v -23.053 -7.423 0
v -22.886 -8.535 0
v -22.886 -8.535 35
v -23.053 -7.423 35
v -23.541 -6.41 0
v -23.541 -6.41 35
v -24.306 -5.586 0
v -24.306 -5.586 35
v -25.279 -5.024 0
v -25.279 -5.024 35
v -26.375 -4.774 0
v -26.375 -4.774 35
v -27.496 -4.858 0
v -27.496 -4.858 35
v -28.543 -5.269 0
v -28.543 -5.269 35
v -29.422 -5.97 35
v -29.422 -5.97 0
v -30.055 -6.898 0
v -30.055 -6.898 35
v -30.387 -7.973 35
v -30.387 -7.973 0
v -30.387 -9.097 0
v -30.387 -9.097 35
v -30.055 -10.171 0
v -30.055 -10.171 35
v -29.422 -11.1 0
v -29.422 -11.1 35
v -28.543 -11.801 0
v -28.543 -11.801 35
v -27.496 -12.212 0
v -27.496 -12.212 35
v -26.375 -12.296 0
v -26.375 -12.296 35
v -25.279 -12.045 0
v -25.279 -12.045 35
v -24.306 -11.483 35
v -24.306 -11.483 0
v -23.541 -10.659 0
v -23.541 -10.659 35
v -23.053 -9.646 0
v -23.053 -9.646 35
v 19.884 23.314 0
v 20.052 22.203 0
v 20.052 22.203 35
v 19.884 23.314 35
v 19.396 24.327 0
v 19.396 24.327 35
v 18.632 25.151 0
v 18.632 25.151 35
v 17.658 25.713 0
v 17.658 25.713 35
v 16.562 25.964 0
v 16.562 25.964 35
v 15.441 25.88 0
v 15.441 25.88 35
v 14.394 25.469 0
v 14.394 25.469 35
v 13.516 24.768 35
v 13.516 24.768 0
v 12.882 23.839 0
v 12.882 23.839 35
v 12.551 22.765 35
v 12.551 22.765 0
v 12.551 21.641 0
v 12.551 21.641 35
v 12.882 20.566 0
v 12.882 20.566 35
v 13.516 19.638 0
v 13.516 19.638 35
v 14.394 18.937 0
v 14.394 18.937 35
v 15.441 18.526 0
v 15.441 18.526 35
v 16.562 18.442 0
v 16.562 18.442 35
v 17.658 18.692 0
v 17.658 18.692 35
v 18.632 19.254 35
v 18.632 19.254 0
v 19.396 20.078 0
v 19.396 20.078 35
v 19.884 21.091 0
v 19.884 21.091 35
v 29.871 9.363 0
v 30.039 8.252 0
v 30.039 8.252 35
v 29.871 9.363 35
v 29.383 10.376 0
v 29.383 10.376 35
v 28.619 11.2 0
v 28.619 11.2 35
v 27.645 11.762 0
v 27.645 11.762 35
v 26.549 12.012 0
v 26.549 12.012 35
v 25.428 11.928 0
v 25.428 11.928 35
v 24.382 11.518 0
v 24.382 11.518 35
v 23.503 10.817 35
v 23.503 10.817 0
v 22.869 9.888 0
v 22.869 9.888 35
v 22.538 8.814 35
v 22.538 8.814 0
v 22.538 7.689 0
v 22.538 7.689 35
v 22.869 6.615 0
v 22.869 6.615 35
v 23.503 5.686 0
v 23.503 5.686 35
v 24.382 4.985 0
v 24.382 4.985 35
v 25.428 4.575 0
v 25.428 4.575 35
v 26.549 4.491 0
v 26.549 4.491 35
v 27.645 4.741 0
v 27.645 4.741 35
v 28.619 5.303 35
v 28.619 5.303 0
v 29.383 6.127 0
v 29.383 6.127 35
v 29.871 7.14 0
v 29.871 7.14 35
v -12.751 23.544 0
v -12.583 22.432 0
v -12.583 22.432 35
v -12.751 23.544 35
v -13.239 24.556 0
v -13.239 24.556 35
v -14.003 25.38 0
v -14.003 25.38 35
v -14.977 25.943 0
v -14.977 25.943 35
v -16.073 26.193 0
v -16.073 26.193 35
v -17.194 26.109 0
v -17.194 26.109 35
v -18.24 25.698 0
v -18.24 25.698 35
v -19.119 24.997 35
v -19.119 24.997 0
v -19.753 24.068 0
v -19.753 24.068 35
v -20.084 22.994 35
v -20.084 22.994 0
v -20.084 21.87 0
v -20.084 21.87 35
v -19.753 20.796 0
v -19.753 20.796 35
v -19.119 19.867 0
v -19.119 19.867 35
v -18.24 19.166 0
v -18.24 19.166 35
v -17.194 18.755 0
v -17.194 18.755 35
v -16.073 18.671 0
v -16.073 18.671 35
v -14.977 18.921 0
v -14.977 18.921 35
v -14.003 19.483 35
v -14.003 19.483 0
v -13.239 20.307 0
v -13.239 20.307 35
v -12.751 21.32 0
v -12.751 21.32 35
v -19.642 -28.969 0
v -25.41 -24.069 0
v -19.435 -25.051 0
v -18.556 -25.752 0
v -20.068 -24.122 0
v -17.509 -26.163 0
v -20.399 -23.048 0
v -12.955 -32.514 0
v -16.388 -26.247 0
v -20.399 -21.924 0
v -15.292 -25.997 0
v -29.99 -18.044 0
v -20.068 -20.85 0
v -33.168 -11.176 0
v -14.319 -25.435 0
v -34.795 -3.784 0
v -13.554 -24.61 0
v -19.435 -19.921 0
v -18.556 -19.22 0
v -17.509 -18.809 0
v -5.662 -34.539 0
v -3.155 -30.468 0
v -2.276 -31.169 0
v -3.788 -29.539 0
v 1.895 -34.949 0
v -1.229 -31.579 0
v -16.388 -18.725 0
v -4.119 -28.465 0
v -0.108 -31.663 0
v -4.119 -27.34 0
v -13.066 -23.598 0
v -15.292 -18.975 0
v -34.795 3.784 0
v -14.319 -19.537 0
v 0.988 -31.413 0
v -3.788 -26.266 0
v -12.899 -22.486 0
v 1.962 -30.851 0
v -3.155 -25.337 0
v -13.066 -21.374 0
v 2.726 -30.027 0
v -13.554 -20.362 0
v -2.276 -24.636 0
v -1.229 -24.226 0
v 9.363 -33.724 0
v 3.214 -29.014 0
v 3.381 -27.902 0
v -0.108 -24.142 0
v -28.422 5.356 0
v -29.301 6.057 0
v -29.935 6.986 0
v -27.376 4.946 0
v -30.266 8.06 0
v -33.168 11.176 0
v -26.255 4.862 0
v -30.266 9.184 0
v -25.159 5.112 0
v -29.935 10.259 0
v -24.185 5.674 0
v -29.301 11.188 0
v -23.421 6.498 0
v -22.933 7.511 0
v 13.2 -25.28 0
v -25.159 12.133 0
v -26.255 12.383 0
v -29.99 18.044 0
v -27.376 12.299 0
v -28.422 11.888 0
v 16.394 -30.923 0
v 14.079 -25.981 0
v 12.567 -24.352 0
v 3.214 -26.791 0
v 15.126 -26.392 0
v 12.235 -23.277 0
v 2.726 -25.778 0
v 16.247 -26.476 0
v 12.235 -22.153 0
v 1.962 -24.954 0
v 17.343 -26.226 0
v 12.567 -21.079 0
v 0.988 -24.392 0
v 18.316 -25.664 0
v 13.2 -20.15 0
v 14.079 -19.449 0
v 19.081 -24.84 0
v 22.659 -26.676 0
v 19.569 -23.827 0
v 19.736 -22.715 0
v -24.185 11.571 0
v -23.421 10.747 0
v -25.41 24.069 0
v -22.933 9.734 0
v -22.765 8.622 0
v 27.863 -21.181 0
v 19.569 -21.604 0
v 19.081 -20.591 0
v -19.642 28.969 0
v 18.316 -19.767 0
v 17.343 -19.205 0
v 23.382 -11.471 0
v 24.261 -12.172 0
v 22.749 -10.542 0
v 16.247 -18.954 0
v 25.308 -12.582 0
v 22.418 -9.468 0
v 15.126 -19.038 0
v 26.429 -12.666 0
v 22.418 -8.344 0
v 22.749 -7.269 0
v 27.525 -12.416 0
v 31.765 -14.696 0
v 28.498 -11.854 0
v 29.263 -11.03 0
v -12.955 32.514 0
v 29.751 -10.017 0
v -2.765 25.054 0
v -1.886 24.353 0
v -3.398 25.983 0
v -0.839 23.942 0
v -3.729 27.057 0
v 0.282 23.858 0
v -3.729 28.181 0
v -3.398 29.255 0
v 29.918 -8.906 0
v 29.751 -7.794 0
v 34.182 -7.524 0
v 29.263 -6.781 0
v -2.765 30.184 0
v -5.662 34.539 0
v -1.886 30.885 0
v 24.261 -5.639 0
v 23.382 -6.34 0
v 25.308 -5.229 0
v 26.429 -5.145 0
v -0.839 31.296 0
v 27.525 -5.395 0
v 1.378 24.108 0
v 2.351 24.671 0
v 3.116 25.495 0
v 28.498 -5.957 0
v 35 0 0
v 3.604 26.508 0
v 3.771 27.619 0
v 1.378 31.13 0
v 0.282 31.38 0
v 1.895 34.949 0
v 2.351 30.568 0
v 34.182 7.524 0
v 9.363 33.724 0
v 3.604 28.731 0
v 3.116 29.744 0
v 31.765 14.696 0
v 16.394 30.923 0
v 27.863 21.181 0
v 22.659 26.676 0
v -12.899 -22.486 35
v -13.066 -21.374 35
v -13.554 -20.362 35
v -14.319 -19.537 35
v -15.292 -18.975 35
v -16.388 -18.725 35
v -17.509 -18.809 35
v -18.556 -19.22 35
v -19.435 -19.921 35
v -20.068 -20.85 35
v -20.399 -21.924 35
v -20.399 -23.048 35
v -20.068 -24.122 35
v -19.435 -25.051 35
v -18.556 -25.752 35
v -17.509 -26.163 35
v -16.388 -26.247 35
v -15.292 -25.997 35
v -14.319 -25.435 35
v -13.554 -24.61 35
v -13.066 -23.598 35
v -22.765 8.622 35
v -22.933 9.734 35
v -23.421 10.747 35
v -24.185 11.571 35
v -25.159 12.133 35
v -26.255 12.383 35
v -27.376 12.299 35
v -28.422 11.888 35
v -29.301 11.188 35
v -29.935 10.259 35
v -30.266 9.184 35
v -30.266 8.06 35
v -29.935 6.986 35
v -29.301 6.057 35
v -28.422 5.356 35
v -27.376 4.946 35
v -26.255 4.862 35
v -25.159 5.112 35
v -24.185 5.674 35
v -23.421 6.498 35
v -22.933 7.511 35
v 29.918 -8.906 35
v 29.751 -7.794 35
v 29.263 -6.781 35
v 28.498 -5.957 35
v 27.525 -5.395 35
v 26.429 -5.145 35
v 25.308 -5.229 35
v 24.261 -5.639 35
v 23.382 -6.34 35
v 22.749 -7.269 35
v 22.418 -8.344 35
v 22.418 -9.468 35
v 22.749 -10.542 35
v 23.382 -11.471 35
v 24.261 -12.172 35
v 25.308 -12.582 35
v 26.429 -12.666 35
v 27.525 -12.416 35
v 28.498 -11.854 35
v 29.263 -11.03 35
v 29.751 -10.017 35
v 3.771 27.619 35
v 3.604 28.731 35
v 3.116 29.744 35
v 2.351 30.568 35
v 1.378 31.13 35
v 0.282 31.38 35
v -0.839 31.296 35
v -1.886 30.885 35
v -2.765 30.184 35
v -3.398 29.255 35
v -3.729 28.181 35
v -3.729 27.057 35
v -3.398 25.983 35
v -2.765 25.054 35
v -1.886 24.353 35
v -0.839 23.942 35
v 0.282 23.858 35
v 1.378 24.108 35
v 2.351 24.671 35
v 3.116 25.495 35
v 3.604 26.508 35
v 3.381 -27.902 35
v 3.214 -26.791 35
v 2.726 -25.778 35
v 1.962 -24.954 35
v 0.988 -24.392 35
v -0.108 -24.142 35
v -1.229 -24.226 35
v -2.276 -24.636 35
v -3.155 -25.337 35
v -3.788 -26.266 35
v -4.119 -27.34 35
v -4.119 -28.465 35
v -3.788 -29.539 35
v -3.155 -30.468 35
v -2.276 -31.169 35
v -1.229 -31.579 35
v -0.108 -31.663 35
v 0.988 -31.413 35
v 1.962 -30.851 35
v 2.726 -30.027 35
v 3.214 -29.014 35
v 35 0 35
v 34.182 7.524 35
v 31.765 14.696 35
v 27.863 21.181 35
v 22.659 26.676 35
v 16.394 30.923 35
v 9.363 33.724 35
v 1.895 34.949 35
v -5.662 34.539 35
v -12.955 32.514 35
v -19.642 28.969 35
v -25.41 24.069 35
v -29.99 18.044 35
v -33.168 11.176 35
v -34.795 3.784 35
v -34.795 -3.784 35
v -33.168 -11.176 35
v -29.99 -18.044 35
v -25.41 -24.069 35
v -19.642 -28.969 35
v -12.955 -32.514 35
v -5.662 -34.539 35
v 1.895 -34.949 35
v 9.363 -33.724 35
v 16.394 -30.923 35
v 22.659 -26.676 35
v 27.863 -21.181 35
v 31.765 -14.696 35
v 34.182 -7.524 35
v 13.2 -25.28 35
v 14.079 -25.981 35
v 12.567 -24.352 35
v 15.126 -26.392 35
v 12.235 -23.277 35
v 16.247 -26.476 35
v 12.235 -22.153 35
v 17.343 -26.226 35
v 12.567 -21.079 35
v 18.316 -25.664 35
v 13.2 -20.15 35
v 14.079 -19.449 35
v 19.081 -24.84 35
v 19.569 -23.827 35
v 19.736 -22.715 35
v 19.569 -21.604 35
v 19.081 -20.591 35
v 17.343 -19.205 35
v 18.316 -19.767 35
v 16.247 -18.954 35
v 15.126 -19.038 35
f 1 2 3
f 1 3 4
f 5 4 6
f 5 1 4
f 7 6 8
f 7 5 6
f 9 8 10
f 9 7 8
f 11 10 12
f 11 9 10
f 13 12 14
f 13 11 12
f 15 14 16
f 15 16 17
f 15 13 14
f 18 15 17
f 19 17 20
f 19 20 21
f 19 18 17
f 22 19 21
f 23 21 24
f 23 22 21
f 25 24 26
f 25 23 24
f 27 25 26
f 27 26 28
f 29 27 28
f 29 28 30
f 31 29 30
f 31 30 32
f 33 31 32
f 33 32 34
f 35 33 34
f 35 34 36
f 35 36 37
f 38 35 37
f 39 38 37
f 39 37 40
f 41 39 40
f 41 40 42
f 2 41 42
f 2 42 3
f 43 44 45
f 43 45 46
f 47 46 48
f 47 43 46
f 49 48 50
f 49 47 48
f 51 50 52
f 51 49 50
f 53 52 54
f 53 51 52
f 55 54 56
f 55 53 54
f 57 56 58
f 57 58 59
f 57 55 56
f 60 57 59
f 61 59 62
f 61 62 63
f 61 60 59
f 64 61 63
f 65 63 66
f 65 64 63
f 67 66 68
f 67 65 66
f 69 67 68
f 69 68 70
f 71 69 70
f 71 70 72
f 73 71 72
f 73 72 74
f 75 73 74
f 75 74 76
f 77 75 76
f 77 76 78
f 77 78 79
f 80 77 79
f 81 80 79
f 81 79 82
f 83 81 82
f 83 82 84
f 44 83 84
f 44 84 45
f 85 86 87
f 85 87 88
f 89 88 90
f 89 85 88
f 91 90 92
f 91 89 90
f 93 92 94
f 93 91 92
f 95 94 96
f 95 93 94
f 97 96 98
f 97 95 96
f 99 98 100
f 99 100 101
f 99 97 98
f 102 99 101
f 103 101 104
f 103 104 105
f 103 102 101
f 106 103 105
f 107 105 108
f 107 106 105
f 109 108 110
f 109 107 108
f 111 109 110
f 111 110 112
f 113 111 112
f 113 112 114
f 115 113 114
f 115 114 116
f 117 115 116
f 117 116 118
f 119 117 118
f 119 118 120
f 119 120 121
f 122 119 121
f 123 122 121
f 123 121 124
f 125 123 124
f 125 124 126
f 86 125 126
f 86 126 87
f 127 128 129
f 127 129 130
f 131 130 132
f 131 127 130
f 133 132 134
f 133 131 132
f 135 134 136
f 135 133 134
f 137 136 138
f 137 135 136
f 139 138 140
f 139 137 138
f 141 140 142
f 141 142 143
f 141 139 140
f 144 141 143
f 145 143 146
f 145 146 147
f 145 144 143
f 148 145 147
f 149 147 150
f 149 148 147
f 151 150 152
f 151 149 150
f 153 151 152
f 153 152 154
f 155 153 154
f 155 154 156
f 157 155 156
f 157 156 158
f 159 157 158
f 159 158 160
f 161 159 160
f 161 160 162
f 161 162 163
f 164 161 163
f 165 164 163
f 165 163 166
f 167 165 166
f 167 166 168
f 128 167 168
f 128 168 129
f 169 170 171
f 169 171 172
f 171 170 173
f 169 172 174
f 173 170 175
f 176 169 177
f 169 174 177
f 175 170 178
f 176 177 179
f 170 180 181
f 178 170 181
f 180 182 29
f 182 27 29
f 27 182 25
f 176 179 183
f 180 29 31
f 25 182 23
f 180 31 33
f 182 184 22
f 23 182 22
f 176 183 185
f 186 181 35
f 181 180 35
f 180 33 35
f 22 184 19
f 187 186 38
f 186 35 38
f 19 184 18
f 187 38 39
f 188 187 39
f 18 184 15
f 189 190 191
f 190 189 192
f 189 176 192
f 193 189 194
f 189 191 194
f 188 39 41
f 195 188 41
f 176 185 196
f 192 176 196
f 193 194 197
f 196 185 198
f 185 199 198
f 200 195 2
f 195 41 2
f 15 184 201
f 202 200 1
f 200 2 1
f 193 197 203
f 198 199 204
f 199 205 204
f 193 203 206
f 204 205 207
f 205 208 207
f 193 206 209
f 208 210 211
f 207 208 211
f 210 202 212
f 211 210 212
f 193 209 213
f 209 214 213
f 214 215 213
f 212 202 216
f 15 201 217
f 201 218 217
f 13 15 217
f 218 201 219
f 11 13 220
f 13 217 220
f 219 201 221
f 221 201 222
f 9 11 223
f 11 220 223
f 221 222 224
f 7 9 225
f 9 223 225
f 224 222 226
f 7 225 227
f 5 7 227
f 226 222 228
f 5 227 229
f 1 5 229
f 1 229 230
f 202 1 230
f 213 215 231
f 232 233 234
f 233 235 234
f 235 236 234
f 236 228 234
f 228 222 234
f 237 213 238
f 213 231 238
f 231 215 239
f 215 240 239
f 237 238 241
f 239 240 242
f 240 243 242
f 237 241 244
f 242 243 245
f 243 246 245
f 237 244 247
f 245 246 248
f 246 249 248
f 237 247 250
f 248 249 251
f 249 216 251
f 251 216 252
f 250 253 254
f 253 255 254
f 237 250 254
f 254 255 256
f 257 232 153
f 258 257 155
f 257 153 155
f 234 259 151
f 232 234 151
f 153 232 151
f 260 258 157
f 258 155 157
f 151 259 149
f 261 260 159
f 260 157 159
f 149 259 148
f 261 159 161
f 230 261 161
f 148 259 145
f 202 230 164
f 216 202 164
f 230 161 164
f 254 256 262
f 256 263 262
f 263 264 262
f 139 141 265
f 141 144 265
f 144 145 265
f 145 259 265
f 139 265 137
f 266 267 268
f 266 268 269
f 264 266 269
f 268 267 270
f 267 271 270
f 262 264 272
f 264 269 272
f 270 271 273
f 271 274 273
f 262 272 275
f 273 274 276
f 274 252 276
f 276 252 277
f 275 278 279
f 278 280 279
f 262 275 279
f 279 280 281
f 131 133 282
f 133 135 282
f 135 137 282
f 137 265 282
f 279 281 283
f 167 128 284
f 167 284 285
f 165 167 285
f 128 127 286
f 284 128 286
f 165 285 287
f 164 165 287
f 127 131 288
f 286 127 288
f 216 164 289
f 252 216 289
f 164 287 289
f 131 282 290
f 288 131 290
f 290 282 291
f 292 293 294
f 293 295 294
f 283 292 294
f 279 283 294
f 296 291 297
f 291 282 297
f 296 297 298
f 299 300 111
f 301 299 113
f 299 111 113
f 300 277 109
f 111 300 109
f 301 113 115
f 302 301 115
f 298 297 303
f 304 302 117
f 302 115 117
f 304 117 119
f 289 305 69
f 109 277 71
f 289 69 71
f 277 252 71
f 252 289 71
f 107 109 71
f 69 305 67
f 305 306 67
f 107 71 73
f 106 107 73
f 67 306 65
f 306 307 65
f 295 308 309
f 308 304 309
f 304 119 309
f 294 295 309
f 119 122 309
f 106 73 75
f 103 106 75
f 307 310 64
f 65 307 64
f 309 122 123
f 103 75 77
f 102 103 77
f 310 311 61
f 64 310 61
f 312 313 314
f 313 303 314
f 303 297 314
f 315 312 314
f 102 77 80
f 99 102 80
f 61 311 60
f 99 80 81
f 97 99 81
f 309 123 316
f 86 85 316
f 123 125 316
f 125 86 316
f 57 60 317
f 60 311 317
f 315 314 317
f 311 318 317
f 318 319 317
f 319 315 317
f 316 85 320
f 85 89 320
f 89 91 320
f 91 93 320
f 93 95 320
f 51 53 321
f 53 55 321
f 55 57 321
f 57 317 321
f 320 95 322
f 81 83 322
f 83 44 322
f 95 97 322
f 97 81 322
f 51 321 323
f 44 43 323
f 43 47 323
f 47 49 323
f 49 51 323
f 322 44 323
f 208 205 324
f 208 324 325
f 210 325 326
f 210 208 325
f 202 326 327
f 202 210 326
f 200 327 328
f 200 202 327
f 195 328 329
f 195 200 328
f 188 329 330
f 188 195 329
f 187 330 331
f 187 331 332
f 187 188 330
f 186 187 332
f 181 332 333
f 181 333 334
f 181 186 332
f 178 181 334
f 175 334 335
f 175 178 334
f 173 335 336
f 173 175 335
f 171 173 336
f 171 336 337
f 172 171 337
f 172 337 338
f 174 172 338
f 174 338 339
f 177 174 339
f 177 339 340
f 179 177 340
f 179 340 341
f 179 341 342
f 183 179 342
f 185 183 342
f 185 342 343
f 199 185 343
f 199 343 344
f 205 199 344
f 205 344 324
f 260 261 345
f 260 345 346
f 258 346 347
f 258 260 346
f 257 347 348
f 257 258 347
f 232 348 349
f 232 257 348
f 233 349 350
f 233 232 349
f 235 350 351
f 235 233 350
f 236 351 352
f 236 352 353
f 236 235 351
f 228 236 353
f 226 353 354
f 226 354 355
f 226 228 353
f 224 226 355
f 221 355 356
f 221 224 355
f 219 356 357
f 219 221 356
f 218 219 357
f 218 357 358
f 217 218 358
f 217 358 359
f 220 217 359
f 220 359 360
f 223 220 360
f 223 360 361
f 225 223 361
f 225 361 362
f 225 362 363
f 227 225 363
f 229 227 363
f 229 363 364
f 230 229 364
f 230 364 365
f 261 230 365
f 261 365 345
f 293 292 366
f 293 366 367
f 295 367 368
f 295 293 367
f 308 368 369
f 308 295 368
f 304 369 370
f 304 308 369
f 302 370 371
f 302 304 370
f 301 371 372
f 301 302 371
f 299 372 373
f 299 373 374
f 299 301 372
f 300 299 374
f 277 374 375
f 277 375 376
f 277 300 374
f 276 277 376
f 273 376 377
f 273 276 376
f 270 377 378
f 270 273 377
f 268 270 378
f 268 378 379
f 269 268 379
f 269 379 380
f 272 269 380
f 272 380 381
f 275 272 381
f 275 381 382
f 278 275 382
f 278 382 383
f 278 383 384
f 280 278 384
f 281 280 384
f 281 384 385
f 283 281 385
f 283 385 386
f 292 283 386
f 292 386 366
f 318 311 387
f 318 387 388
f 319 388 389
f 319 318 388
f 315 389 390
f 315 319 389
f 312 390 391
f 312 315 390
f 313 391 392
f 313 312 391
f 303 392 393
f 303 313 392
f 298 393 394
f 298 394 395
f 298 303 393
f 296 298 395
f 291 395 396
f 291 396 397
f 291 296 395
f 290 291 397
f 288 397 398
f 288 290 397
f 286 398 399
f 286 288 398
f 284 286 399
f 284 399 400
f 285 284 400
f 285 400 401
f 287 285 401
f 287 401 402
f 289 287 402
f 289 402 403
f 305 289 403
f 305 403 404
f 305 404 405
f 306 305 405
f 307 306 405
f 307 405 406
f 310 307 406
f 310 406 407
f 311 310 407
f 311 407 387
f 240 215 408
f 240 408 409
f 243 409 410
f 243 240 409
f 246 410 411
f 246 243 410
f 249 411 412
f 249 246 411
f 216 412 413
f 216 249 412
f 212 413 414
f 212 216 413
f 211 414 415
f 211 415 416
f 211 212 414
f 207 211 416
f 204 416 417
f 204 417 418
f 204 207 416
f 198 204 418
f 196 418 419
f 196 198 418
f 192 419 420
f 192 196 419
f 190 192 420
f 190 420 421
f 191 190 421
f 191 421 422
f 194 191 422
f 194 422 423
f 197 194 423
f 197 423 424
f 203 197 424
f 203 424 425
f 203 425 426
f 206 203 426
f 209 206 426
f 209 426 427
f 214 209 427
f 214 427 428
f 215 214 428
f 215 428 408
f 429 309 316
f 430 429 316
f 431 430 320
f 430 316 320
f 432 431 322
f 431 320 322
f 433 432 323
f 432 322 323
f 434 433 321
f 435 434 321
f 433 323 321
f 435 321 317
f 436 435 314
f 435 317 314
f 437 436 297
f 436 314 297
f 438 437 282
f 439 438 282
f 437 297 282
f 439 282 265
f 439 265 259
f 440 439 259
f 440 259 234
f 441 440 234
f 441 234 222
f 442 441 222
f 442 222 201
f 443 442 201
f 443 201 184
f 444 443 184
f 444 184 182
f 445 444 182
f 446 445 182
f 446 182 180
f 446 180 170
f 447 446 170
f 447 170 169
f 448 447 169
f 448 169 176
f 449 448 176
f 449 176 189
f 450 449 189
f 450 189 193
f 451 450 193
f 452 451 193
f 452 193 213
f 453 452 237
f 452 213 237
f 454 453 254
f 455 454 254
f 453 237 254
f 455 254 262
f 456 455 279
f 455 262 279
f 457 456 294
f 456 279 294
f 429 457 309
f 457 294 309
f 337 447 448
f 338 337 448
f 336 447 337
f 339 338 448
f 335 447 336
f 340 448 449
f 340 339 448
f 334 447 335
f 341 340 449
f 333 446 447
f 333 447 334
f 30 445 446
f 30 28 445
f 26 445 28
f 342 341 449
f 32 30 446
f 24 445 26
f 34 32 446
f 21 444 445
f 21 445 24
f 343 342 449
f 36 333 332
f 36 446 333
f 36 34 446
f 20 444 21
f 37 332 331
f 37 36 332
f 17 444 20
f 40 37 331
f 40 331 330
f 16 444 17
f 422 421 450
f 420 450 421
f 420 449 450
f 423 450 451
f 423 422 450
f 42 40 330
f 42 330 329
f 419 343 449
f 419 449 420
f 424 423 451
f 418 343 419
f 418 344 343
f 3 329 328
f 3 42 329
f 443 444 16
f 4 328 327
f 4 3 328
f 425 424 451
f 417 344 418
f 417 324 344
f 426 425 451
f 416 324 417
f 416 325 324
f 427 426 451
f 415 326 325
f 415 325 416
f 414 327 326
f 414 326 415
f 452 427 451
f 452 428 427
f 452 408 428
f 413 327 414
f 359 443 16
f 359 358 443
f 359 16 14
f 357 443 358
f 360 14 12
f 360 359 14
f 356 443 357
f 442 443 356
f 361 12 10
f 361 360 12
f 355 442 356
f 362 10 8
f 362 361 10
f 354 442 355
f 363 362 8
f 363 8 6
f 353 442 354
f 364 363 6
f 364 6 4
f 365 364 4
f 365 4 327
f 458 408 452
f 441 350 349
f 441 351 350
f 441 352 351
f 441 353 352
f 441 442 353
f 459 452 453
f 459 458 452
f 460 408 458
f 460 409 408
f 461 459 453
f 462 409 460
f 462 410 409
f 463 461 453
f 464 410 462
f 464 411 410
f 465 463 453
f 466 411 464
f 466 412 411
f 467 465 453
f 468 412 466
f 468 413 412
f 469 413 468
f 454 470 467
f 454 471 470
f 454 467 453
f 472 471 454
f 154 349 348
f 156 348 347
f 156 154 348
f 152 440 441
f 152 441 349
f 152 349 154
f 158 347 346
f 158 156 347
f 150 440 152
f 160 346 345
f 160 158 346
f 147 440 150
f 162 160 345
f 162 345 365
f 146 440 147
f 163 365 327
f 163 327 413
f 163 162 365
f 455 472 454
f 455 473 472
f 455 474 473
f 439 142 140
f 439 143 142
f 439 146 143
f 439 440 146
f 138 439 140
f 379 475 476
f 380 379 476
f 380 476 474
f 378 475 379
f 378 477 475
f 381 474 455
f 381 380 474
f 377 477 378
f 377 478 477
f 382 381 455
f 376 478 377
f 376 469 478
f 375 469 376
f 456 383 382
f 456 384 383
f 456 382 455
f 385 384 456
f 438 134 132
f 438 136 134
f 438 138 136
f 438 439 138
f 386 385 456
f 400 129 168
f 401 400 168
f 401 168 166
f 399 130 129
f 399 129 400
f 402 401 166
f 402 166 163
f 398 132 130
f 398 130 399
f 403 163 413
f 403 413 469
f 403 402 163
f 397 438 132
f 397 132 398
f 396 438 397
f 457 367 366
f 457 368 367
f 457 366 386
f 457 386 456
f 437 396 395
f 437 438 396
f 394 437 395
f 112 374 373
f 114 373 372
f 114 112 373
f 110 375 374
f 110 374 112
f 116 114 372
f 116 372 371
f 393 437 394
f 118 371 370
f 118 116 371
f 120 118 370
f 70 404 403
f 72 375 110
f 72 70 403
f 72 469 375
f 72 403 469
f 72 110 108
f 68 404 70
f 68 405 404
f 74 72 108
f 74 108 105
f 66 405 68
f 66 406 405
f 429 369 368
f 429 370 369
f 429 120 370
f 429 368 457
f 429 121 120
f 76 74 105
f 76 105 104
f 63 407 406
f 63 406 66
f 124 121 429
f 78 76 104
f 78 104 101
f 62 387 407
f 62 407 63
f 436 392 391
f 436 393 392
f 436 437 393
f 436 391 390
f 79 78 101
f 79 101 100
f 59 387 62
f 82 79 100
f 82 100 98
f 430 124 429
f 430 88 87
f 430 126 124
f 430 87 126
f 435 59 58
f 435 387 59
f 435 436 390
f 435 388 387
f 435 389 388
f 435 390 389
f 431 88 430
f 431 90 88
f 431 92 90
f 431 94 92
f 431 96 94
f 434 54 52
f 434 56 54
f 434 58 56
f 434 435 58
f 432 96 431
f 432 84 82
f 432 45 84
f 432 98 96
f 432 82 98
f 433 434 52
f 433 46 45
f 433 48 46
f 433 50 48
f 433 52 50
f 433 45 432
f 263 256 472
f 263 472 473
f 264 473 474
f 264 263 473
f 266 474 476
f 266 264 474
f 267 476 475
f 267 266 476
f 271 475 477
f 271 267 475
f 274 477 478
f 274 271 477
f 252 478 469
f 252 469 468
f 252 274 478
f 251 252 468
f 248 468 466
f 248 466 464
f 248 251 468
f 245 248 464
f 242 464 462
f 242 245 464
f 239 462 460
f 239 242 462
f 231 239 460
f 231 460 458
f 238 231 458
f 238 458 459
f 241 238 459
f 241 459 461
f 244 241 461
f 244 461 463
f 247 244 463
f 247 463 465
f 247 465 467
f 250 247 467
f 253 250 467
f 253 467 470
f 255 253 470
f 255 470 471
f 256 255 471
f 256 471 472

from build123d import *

# Parameters (mm, degrees)
F0_R     = 35
F0_R_2   = 3.771368
F1_DEPTH = 35
F2_DEPTH = 25


with BuildPart() as f1:
    # F0 (on Top) → F1 (new body)
    with BuildSketch(Plane.XY):
        Circle(F0_R)
        with Locations((-0.389893, -27.902429)):
            Circle(F0_R_2, mode=Mode.SUBTRACT)
        with Locations((-16.670046, -22.486003)):
            Circle(F0_R_2, mode=Mode.SUBTRACT)
        with Locations((-26.65727, -8.534788)):
            Circle(F0_R_2, mode=Mode.SUBTRACT)
        with Locations((15.964723, -22.715176)):
            Circle(F0_R_2, mode=Mode.SUBTRACT)
        with Locations((26.146894, -8.905599)):
            Circle(F0_R_2, mode=Mode.SUBTRACT)
        with Locations((-26.536787, 8.622325)):
            Circle(F0_R_2, mode=Mode.SUBTRACT)
        with Locations((-16.354616, 22.431902)):
            Circle(F0_R_2, mode=Mode.SUBTRACT)
        with Locations((26.267377, 8.251514)):
            Circle(F0_R_2, mode=Mode.SUBTRACT)
        with Locations((16.280153, 22.202729)):
            Circle(F0_R_2, mode=Mode.SUBTRACT)
        with Locations((0, 27.619155)):
            Circle(F0_R_2, mode=Mode.SUBTRACT)
    extrude(amount=F1_DEPTH)

    # F0 (on Top) → F2 (join)
    with BuildSketch(Plane.XY):
        Circle(F0_R)
        with Locations((-0.389893, -27.902429)):
            Circle(F0_R_2, mode=Mode.SUBTRACT)
        with Locations((-16.670046, -22.486003)):
            Circle(F0_R_2, mode=Mode.SUBTRACT)
        with Locations((-26.65727, -8.534788)):
            Circle(F0_R_2, mode=Mode.SUBTRACT)
        with Locations((15.964723, -22.715176)):
            Circle(F0_R_2, mode=Mode.SUBTRACT)
        with Locations((26.146894, -8.905599)):
            Circle(F0_R_2, mode=Mode.SUBTRACT)
        with Locations((-26.536787, 8.622325)):
            Circle(F0_R_2, mode=Mode.SUBTRACT)
        with Locations((-16.354616, 22.431902)):
            Circle(F0_R_2, mode=Mode.SUBTRACT)
        with Locations((26.267377, 8.251514)):
            Circle(F0_R_2, mode=Mode.SUBTRACT)
        with Locations((16.280153, 22.202729)):
            Circle(F0_R_2, mode=Mode.SUBTRACT)
        with Locations((0, 27.619155)):
            Circle(F0_R_2, mode=Mode.SUBTRACT)
    extrude(amount=F2_DEPTH)


solid = f1.part
